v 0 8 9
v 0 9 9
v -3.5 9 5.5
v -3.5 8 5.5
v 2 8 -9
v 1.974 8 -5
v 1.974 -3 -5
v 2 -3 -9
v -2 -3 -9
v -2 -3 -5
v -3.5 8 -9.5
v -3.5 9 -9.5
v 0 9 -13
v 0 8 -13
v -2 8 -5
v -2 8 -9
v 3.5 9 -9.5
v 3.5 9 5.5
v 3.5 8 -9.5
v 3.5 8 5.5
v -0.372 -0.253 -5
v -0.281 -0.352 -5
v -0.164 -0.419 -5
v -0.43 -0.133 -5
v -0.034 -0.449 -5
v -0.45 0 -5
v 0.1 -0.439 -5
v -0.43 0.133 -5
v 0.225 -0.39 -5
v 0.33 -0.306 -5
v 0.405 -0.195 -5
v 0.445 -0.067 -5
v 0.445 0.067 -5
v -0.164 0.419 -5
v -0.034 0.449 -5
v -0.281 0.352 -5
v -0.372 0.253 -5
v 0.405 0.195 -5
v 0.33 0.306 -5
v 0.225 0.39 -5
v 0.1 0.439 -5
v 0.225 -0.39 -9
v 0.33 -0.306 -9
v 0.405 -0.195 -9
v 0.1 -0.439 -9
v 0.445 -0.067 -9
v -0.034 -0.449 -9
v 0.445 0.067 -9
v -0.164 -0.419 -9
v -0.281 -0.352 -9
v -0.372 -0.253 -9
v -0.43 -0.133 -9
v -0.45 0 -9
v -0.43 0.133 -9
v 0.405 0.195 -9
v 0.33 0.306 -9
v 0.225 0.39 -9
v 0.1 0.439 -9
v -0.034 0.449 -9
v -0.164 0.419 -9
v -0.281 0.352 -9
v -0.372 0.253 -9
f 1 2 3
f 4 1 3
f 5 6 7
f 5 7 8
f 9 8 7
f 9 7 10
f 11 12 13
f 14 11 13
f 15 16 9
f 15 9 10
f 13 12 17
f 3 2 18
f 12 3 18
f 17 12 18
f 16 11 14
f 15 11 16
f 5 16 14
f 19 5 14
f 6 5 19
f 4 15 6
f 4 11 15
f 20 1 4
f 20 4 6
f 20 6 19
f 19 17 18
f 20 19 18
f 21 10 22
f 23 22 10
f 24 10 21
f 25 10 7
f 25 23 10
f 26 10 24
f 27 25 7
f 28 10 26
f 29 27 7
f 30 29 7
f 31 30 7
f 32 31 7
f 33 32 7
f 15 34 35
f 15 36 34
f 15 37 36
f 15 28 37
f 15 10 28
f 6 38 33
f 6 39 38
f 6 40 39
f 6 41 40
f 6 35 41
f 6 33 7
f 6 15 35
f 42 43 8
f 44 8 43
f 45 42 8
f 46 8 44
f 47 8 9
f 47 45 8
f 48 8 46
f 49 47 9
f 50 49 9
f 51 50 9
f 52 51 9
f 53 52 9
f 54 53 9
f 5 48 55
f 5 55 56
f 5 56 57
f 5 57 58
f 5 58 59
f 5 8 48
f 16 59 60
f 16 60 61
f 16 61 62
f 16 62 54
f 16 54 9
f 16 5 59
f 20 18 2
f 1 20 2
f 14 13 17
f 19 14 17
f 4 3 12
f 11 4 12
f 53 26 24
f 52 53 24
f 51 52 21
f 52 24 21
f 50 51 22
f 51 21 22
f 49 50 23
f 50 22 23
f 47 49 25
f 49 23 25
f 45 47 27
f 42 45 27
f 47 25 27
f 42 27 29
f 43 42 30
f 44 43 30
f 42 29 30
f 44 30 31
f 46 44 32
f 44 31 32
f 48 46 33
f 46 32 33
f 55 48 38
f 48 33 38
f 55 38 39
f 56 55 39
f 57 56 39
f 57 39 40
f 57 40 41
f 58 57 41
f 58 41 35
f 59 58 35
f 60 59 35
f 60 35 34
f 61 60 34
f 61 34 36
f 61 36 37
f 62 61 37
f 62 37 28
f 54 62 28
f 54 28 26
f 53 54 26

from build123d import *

# Parameters (mm, degrees)
PAD005_DEPTH            = 1
PAD006_DEPTH            = 11
SKETCH007_R             = 0.45
POCKET_DEPTH            = 10
BODY003_PLACEMENT_ANGLE = 90


with BuildPart() as part:
    # Sketch005 → Pad005 (new body)
    with BuildSketch(Plane.XY):
        Polygon((0, -11), (3.5, -7.5), (3.5, 7.5), (0, 11), (-3.5, 7.5), (-3.5, -7.5), align=None)
    extrude(amount=PAD005_DEPTH)

    # Sketch006 (on Face8 of Pad005) → Pad006 (join)
    with BuildSketch(Plane.XY.offset(1)):
        Polygon((-2, -3), (1.973969, -3), (2, -7), (-2, -7), align=None)
    extrude(amount=PAD006_DEPTH)

    # Sketch007 (on Face12 of Pad006) → Pocket (cut)
    with BuildSketch(Plane(origin=(0, -3, 0), x_dir=(-1, 0, 0), z_dir=(0, 1, 0))):
        with Locations((0, 9)):
            Circle(SKETCH007_R)
    extrude(amount=-POCKET_DEPTH, mode=Mode.SUBTRACT)


with BuildPart() as part_1:
    # Body003 placement: moved
    add(part.part.moved(Location((0, 9, -2))).rotate(Axis((0, 9, -2), (1, 0, 0)), BODY003_PLACEMENT_ANGLE))


solid = part_1.part
